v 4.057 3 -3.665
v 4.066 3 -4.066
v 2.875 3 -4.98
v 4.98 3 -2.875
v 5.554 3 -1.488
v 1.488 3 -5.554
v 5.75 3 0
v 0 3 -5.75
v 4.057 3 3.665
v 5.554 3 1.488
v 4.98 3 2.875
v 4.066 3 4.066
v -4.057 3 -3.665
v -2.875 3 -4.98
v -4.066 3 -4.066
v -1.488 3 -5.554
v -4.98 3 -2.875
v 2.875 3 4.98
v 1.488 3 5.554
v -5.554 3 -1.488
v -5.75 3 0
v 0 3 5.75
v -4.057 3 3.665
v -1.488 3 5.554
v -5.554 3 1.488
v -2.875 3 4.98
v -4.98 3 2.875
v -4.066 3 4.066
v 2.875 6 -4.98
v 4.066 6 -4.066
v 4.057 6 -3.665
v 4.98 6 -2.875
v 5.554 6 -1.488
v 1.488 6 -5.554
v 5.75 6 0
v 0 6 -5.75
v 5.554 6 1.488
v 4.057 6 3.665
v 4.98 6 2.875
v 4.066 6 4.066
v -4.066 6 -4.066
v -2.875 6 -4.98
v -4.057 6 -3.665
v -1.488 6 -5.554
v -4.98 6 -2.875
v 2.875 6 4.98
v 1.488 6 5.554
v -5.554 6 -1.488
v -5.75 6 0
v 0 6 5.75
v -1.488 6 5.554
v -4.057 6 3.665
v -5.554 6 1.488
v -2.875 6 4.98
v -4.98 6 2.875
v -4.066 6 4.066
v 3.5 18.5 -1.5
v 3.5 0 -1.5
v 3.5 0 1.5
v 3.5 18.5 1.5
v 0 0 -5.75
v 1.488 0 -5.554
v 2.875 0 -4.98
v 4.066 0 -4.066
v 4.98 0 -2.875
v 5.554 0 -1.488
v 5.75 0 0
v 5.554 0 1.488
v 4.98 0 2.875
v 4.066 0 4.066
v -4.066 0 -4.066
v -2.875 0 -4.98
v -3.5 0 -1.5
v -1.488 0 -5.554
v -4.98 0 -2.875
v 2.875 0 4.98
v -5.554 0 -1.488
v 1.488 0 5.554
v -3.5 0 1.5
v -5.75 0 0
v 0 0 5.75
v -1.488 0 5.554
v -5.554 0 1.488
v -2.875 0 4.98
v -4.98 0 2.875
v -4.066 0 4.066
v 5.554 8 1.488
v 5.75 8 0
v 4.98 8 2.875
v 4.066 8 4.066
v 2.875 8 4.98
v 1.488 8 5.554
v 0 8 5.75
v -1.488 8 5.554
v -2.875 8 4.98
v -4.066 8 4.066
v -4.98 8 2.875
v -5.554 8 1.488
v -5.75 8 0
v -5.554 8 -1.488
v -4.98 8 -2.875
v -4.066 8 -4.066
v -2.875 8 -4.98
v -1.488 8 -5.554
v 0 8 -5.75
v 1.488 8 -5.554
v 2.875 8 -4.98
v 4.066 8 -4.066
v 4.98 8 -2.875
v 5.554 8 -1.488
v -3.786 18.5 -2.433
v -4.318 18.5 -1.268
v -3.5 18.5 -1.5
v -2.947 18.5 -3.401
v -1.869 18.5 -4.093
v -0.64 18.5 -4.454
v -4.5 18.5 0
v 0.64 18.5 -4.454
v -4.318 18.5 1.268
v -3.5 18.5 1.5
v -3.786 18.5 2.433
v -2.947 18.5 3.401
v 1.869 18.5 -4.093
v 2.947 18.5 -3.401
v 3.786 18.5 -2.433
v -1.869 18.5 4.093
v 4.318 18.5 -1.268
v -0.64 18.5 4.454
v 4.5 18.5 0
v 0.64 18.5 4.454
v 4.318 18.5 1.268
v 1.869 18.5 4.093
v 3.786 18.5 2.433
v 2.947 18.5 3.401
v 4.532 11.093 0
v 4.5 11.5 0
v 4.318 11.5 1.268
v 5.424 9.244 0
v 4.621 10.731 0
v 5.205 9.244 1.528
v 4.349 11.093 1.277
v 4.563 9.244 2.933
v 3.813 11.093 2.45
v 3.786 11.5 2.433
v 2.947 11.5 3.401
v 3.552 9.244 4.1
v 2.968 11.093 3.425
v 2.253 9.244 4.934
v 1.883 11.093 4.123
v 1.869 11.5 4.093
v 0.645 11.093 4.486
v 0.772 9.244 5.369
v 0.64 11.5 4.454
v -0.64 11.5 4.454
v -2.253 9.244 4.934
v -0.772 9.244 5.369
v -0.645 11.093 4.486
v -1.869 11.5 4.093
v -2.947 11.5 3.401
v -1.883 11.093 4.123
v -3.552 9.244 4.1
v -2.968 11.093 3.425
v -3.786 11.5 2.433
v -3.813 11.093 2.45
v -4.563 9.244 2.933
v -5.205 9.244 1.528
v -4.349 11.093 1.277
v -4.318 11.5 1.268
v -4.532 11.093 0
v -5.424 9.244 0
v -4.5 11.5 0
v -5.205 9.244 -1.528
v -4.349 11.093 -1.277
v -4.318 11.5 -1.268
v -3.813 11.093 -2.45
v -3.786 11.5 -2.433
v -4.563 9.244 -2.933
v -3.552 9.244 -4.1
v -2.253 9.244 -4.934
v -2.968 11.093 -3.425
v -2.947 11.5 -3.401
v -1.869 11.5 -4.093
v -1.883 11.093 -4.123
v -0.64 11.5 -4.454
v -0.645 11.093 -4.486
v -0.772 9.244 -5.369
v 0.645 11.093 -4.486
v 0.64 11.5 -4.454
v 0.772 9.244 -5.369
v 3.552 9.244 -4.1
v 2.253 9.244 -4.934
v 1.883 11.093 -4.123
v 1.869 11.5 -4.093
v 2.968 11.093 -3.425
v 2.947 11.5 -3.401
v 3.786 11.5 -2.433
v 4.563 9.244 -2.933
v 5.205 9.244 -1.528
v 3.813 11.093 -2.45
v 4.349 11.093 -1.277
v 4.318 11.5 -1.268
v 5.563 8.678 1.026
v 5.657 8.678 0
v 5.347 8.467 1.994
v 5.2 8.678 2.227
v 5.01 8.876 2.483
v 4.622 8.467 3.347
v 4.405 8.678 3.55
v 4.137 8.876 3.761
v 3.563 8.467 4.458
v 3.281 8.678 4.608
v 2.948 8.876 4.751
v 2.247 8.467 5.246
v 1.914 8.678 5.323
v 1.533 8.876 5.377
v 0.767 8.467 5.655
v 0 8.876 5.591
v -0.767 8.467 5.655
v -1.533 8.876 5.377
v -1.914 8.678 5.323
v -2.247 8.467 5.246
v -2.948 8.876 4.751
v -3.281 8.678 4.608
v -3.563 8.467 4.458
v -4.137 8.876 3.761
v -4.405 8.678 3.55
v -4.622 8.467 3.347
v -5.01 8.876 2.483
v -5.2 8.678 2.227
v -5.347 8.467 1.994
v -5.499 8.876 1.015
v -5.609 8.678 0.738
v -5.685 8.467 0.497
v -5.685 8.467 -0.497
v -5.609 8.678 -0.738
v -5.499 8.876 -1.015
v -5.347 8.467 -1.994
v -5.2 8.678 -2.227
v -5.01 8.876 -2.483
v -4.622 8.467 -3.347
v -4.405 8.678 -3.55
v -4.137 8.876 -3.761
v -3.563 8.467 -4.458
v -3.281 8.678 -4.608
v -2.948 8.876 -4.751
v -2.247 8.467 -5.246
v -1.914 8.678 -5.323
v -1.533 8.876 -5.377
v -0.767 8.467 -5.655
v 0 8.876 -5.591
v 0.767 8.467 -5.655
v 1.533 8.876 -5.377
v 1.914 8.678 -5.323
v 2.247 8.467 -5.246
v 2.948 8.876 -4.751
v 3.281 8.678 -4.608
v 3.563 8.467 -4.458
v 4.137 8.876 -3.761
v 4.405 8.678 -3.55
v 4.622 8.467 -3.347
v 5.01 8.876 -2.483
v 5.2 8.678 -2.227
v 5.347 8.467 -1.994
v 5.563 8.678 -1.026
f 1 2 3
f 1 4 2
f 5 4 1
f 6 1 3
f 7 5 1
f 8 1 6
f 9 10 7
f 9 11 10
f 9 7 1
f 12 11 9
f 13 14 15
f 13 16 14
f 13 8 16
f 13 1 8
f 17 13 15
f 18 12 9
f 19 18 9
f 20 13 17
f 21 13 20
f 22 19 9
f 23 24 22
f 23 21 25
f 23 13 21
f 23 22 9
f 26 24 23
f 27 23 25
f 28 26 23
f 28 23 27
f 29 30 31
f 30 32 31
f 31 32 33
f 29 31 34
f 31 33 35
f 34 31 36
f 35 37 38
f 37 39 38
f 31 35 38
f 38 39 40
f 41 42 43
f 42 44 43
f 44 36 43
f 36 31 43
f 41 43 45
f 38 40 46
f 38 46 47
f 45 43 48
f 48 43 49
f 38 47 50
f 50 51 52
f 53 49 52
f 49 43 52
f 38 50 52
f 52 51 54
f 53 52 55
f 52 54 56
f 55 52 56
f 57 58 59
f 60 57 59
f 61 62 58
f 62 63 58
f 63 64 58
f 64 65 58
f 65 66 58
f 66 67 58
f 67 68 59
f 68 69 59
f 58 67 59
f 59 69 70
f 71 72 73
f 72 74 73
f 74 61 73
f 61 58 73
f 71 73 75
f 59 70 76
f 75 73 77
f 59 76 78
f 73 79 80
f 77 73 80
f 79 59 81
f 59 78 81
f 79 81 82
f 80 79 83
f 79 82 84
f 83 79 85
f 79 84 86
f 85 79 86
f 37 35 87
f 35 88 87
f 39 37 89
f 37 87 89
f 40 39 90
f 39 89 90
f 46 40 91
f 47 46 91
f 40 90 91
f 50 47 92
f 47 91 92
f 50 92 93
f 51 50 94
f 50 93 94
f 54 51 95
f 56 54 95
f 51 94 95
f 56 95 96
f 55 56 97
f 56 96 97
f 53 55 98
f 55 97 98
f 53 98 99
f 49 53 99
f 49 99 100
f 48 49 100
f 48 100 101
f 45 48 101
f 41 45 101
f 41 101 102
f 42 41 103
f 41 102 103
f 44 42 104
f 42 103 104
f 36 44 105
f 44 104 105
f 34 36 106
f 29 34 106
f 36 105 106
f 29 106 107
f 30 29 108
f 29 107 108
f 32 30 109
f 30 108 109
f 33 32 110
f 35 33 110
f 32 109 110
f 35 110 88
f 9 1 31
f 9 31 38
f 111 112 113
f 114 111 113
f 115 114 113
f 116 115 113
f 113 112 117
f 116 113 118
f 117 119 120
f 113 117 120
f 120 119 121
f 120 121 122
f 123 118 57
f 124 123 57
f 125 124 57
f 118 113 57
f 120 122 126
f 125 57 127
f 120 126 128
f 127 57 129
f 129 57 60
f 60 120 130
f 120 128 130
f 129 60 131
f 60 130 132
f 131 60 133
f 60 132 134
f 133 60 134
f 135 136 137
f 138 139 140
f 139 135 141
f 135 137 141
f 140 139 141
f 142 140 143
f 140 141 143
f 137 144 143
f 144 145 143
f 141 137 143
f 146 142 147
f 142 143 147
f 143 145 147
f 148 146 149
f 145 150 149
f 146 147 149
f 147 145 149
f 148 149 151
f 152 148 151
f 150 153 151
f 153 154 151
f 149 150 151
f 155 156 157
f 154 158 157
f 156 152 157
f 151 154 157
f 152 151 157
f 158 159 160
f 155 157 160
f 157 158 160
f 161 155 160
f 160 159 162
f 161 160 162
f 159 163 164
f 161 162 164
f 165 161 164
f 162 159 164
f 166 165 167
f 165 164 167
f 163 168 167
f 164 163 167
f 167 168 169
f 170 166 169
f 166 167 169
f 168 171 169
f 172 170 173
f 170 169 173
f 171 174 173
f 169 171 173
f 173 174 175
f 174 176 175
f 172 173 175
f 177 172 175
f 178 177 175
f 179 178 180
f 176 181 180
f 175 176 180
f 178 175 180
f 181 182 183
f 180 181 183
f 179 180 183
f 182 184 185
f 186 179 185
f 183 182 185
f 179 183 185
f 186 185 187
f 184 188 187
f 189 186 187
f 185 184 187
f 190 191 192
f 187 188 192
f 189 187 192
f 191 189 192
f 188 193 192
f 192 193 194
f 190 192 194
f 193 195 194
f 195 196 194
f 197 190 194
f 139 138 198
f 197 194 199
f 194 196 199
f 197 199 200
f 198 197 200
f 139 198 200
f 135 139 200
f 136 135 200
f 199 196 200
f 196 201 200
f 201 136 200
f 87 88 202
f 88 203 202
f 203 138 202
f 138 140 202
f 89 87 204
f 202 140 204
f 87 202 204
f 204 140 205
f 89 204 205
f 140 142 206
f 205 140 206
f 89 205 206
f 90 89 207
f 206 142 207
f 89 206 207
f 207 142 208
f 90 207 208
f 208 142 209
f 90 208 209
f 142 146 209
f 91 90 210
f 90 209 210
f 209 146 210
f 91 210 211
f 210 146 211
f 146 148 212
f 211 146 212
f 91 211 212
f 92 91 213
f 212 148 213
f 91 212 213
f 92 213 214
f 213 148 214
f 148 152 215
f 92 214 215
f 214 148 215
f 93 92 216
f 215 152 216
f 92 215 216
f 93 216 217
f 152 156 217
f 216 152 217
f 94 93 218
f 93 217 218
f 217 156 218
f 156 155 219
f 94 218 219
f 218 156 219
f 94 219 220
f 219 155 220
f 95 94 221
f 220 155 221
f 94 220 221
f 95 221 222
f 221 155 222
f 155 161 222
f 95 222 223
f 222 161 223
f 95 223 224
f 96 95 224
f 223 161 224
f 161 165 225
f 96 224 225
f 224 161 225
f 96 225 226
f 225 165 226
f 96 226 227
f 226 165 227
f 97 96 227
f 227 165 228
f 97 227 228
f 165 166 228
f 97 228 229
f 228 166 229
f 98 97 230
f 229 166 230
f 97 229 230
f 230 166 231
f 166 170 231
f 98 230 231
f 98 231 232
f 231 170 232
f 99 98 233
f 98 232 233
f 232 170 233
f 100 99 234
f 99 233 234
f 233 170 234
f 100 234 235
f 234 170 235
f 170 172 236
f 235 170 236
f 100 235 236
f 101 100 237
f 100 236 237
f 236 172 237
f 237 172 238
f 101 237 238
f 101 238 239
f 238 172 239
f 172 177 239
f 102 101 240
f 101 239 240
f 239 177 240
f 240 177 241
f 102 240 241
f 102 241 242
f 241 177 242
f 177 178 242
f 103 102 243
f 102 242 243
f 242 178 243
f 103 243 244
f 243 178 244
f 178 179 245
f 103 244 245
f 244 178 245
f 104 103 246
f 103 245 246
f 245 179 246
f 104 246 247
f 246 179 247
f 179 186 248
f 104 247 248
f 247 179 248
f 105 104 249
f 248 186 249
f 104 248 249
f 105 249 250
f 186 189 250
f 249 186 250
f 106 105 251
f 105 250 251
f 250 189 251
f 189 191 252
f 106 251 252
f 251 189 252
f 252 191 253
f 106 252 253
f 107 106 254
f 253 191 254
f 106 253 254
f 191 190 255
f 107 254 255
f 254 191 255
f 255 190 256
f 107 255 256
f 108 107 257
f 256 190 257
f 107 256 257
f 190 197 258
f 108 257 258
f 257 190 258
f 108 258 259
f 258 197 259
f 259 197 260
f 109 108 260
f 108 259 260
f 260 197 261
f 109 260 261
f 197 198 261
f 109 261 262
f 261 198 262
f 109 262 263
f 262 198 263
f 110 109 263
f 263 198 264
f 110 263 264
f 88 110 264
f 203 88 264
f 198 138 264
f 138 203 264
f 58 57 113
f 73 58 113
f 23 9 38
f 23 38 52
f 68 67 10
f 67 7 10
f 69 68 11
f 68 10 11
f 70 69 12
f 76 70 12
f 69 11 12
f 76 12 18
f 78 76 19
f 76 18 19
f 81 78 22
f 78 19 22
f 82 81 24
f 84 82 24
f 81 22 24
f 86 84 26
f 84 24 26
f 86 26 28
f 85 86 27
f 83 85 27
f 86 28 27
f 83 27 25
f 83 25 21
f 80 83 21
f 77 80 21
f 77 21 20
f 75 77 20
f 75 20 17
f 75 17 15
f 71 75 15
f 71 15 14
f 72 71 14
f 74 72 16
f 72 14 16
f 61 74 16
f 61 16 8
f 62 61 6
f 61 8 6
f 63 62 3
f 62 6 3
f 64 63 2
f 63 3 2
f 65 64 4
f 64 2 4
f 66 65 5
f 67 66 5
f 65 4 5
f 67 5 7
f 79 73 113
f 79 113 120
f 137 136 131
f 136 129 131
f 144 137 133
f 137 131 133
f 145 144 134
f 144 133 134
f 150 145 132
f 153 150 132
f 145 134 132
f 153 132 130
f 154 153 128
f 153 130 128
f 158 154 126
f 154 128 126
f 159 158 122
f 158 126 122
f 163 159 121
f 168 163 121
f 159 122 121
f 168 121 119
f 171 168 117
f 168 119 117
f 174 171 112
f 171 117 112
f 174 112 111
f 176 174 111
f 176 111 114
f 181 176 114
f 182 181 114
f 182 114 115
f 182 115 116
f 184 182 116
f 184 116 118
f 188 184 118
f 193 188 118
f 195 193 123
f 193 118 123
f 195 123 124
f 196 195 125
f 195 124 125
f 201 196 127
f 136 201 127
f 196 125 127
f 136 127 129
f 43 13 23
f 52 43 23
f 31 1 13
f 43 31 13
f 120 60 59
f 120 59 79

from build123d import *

# Parameters (mm, degrees)
F0_W     = 5.75
F0_H     = 3
F2_W     = 8.114334
F2_H     = 7.330208
F3_DEPTH = 3
F4_W     = 7
F4_H     = 3
F5_DEPTH = 18.501


with BuildPart() as f1:
    # F0 (on Top) → F1 (revolve)
    with BuildSketch(Plane.XY):
        with BuildLine():
            Line((4.5, 18.5), (0, 18.5))
            Line((0, 18.5), (0, 6))
            Line((0, 6), (5.75, 6))
            Line((5.75, 6), (5.75, 8))
            add(Edge.make_bspline(
                [(5.75, 8), (5.75, 9.5), (4.5, 10), (4.5, 11.5)],
                knots=[0, 0, 0, 0, 3.716517, 3.716517, 3.716517, 3.716517], degree=3))
            Line((4.5, 11.5), (4.5, 18.5))
        make_face()
        with Locations((2.875, 1.5)):
            Rectangle(F0_W, F0_H)
    revolve(axis=Axis((0, 7.539056, 0), (0, -1, 0)))

    # F2 (on face) → F3 (join, through all)
    with BuildSketch(Plane(origin=(0, 3, 0), x_dir=(-1, 0, 0), z_dir=(0, 1, 0))):
        Rectangle(F2_W, F2_H)
    extrude(amount=F3_DEPTH)

    # F4 (on face) → F5 (cut, through all)
    with BuildSketch(Plane(origin=(0, 18.5, 0), x_dir=(-1, 0, 0), z_dir=(0, 1, 0))):
        Rectangle(F4_W, F4_H)
    extrude(amount=-F5_DEPTH, mode=Mode.SUBTRACT)


solid = f1.part
